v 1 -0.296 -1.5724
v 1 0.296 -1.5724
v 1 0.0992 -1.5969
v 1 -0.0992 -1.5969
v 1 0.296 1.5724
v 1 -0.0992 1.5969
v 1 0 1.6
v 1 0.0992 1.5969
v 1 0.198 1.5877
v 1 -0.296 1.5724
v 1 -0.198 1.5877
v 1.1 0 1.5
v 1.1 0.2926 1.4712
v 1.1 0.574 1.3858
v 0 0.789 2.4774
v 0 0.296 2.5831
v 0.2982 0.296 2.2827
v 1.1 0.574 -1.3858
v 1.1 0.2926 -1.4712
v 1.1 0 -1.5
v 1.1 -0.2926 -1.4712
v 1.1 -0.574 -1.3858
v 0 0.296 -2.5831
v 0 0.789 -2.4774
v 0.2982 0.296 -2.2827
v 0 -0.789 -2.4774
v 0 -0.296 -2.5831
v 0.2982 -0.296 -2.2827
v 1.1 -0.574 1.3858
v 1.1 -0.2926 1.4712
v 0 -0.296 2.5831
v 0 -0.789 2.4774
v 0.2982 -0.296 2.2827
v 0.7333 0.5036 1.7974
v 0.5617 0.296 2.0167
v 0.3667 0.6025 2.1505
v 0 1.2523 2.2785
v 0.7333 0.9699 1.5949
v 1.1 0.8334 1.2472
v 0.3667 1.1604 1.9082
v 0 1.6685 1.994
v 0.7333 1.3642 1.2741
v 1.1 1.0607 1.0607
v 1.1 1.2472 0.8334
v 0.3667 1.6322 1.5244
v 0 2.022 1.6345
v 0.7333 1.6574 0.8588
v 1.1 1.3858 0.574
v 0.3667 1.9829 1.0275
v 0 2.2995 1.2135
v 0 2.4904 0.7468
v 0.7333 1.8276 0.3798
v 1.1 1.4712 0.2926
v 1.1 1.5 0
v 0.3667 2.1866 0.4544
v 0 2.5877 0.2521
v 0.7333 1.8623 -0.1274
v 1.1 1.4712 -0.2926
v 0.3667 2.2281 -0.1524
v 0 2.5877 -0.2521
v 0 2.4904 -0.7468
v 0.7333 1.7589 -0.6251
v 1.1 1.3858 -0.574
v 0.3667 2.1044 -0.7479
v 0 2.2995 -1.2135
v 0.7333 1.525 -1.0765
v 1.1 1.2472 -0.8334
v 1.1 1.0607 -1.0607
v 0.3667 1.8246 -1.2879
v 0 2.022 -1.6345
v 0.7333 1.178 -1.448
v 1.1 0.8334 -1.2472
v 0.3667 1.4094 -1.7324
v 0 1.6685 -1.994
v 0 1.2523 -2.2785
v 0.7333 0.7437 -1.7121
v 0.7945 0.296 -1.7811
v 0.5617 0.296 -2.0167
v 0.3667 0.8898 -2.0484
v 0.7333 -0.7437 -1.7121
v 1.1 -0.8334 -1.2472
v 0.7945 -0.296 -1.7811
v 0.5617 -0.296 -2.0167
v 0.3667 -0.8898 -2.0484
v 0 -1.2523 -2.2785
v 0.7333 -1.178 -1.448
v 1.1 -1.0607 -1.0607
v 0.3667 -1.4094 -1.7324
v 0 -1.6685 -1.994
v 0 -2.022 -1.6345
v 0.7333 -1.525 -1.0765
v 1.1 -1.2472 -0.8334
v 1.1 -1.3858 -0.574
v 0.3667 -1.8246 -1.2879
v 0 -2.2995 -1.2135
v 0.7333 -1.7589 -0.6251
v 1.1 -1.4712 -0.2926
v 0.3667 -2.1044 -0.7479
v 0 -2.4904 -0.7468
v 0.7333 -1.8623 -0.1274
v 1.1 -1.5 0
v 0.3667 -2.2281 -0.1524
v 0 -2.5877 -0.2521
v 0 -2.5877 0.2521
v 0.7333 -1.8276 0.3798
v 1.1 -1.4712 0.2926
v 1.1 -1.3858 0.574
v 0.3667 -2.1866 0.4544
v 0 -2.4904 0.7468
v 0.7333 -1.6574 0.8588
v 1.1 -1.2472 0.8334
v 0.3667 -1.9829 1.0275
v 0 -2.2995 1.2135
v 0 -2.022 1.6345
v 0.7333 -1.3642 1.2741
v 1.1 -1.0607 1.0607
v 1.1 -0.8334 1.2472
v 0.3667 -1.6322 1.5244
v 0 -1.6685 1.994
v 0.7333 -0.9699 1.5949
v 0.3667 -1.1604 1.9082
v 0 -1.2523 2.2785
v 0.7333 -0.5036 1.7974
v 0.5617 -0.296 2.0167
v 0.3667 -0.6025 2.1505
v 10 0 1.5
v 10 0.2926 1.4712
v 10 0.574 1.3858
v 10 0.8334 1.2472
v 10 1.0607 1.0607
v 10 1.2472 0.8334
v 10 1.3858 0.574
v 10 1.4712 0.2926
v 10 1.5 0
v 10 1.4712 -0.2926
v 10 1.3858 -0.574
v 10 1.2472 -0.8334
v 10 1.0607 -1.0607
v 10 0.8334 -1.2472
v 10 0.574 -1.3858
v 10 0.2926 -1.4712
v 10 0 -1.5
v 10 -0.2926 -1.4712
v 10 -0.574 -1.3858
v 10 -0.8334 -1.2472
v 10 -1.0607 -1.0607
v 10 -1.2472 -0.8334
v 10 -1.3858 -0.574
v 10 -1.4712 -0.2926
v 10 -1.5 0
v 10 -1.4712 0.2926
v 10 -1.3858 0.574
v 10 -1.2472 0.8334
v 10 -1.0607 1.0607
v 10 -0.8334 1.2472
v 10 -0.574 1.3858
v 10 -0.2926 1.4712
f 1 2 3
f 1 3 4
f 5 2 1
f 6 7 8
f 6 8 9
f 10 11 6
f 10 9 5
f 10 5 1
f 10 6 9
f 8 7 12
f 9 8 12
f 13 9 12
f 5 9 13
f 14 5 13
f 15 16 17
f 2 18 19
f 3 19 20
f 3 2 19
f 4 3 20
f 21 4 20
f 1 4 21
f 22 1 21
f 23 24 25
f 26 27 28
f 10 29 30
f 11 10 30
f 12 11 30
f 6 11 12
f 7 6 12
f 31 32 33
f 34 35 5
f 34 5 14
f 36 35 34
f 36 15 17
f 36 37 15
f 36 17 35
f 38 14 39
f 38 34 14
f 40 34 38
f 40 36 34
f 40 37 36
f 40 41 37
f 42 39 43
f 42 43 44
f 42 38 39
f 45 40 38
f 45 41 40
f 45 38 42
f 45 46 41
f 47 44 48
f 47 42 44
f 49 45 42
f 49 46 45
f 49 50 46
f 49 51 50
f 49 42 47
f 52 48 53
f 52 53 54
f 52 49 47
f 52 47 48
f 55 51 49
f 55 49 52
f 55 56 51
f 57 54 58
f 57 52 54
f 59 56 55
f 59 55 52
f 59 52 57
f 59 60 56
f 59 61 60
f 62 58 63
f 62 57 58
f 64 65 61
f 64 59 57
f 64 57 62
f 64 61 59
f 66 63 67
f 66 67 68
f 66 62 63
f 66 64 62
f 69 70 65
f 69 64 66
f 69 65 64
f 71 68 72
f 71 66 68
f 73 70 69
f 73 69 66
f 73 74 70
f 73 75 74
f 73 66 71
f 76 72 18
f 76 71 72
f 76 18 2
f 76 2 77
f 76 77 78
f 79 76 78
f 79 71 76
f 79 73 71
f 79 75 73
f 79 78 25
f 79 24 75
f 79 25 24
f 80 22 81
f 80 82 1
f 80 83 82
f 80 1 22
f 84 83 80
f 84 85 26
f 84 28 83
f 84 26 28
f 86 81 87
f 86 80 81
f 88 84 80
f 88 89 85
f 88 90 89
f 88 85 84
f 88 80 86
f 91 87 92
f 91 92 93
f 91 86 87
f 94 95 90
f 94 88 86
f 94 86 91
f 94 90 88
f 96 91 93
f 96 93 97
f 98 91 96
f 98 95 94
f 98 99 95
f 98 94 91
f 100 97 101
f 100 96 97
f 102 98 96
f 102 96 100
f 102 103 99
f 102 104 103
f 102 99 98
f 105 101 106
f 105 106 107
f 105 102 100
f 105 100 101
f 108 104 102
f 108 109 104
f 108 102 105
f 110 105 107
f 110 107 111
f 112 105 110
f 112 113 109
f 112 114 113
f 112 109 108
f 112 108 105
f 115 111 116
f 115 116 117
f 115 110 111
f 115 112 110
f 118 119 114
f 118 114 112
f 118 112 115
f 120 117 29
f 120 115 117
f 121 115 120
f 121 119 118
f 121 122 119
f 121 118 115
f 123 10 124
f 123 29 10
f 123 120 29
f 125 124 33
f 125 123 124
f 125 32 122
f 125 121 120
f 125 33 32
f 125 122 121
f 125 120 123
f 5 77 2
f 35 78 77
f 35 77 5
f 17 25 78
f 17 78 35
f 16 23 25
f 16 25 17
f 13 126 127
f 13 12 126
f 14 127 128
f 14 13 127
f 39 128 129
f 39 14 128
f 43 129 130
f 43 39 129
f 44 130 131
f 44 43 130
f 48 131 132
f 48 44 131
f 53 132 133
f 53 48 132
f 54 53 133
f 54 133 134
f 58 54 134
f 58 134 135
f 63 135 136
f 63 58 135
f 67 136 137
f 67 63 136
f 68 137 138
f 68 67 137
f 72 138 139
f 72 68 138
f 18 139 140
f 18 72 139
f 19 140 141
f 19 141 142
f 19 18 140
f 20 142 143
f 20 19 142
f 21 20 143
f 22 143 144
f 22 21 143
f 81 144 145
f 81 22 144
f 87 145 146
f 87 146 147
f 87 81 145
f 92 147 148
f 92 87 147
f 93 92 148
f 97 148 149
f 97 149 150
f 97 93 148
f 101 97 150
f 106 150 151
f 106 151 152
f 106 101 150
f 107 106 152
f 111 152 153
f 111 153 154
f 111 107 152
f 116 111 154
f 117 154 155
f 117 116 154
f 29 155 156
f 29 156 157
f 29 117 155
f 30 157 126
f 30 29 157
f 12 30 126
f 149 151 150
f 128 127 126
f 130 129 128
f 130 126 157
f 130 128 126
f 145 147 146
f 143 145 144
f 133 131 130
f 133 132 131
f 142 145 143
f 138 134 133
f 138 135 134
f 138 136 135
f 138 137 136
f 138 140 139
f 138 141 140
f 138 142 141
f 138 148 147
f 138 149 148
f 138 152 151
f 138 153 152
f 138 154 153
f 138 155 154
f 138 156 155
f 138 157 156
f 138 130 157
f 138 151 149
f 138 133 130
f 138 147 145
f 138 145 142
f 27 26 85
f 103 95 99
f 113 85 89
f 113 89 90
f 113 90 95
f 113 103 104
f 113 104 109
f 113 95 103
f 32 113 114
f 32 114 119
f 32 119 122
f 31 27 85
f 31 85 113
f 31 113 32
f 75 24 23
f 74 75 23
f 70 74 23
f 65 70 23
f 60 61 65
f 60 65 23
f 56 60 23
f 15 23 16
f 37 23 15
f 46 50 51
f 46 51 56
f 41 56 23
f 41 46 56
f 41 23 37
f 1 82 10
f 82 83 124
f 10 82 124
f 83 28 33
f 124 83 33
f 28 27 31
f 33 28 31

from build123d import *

# Parameters (mm, degrees)
F2_W     = 0.591972
F2_H     = 6.072902
F3_DEPTH = 1


with BuildPart() as f1:
    # F0 (on Front) → F1 (revolve)
    with BuildSketch(Plane.XZ):
        Polygon((0, 2.6), (0, 0), (10, 0), (10, 1.5), (1.1, 1.5), align=None)
    revolve(axis=Axis((5, 0, 0), (-1, 0, 0)))

    # F2 (on face) → F3 (cut)
    with BuildSketch(Plane(origin=(0, 0, 0), x_dir=(0, -1, 0), z_dir=(-1, 0, 0))):
        Rectangle(F2_W, F2_H)
    extrude(amount=-F3_DEPTH, mode=Mode.SUBTRACT)


solid = f1.part
